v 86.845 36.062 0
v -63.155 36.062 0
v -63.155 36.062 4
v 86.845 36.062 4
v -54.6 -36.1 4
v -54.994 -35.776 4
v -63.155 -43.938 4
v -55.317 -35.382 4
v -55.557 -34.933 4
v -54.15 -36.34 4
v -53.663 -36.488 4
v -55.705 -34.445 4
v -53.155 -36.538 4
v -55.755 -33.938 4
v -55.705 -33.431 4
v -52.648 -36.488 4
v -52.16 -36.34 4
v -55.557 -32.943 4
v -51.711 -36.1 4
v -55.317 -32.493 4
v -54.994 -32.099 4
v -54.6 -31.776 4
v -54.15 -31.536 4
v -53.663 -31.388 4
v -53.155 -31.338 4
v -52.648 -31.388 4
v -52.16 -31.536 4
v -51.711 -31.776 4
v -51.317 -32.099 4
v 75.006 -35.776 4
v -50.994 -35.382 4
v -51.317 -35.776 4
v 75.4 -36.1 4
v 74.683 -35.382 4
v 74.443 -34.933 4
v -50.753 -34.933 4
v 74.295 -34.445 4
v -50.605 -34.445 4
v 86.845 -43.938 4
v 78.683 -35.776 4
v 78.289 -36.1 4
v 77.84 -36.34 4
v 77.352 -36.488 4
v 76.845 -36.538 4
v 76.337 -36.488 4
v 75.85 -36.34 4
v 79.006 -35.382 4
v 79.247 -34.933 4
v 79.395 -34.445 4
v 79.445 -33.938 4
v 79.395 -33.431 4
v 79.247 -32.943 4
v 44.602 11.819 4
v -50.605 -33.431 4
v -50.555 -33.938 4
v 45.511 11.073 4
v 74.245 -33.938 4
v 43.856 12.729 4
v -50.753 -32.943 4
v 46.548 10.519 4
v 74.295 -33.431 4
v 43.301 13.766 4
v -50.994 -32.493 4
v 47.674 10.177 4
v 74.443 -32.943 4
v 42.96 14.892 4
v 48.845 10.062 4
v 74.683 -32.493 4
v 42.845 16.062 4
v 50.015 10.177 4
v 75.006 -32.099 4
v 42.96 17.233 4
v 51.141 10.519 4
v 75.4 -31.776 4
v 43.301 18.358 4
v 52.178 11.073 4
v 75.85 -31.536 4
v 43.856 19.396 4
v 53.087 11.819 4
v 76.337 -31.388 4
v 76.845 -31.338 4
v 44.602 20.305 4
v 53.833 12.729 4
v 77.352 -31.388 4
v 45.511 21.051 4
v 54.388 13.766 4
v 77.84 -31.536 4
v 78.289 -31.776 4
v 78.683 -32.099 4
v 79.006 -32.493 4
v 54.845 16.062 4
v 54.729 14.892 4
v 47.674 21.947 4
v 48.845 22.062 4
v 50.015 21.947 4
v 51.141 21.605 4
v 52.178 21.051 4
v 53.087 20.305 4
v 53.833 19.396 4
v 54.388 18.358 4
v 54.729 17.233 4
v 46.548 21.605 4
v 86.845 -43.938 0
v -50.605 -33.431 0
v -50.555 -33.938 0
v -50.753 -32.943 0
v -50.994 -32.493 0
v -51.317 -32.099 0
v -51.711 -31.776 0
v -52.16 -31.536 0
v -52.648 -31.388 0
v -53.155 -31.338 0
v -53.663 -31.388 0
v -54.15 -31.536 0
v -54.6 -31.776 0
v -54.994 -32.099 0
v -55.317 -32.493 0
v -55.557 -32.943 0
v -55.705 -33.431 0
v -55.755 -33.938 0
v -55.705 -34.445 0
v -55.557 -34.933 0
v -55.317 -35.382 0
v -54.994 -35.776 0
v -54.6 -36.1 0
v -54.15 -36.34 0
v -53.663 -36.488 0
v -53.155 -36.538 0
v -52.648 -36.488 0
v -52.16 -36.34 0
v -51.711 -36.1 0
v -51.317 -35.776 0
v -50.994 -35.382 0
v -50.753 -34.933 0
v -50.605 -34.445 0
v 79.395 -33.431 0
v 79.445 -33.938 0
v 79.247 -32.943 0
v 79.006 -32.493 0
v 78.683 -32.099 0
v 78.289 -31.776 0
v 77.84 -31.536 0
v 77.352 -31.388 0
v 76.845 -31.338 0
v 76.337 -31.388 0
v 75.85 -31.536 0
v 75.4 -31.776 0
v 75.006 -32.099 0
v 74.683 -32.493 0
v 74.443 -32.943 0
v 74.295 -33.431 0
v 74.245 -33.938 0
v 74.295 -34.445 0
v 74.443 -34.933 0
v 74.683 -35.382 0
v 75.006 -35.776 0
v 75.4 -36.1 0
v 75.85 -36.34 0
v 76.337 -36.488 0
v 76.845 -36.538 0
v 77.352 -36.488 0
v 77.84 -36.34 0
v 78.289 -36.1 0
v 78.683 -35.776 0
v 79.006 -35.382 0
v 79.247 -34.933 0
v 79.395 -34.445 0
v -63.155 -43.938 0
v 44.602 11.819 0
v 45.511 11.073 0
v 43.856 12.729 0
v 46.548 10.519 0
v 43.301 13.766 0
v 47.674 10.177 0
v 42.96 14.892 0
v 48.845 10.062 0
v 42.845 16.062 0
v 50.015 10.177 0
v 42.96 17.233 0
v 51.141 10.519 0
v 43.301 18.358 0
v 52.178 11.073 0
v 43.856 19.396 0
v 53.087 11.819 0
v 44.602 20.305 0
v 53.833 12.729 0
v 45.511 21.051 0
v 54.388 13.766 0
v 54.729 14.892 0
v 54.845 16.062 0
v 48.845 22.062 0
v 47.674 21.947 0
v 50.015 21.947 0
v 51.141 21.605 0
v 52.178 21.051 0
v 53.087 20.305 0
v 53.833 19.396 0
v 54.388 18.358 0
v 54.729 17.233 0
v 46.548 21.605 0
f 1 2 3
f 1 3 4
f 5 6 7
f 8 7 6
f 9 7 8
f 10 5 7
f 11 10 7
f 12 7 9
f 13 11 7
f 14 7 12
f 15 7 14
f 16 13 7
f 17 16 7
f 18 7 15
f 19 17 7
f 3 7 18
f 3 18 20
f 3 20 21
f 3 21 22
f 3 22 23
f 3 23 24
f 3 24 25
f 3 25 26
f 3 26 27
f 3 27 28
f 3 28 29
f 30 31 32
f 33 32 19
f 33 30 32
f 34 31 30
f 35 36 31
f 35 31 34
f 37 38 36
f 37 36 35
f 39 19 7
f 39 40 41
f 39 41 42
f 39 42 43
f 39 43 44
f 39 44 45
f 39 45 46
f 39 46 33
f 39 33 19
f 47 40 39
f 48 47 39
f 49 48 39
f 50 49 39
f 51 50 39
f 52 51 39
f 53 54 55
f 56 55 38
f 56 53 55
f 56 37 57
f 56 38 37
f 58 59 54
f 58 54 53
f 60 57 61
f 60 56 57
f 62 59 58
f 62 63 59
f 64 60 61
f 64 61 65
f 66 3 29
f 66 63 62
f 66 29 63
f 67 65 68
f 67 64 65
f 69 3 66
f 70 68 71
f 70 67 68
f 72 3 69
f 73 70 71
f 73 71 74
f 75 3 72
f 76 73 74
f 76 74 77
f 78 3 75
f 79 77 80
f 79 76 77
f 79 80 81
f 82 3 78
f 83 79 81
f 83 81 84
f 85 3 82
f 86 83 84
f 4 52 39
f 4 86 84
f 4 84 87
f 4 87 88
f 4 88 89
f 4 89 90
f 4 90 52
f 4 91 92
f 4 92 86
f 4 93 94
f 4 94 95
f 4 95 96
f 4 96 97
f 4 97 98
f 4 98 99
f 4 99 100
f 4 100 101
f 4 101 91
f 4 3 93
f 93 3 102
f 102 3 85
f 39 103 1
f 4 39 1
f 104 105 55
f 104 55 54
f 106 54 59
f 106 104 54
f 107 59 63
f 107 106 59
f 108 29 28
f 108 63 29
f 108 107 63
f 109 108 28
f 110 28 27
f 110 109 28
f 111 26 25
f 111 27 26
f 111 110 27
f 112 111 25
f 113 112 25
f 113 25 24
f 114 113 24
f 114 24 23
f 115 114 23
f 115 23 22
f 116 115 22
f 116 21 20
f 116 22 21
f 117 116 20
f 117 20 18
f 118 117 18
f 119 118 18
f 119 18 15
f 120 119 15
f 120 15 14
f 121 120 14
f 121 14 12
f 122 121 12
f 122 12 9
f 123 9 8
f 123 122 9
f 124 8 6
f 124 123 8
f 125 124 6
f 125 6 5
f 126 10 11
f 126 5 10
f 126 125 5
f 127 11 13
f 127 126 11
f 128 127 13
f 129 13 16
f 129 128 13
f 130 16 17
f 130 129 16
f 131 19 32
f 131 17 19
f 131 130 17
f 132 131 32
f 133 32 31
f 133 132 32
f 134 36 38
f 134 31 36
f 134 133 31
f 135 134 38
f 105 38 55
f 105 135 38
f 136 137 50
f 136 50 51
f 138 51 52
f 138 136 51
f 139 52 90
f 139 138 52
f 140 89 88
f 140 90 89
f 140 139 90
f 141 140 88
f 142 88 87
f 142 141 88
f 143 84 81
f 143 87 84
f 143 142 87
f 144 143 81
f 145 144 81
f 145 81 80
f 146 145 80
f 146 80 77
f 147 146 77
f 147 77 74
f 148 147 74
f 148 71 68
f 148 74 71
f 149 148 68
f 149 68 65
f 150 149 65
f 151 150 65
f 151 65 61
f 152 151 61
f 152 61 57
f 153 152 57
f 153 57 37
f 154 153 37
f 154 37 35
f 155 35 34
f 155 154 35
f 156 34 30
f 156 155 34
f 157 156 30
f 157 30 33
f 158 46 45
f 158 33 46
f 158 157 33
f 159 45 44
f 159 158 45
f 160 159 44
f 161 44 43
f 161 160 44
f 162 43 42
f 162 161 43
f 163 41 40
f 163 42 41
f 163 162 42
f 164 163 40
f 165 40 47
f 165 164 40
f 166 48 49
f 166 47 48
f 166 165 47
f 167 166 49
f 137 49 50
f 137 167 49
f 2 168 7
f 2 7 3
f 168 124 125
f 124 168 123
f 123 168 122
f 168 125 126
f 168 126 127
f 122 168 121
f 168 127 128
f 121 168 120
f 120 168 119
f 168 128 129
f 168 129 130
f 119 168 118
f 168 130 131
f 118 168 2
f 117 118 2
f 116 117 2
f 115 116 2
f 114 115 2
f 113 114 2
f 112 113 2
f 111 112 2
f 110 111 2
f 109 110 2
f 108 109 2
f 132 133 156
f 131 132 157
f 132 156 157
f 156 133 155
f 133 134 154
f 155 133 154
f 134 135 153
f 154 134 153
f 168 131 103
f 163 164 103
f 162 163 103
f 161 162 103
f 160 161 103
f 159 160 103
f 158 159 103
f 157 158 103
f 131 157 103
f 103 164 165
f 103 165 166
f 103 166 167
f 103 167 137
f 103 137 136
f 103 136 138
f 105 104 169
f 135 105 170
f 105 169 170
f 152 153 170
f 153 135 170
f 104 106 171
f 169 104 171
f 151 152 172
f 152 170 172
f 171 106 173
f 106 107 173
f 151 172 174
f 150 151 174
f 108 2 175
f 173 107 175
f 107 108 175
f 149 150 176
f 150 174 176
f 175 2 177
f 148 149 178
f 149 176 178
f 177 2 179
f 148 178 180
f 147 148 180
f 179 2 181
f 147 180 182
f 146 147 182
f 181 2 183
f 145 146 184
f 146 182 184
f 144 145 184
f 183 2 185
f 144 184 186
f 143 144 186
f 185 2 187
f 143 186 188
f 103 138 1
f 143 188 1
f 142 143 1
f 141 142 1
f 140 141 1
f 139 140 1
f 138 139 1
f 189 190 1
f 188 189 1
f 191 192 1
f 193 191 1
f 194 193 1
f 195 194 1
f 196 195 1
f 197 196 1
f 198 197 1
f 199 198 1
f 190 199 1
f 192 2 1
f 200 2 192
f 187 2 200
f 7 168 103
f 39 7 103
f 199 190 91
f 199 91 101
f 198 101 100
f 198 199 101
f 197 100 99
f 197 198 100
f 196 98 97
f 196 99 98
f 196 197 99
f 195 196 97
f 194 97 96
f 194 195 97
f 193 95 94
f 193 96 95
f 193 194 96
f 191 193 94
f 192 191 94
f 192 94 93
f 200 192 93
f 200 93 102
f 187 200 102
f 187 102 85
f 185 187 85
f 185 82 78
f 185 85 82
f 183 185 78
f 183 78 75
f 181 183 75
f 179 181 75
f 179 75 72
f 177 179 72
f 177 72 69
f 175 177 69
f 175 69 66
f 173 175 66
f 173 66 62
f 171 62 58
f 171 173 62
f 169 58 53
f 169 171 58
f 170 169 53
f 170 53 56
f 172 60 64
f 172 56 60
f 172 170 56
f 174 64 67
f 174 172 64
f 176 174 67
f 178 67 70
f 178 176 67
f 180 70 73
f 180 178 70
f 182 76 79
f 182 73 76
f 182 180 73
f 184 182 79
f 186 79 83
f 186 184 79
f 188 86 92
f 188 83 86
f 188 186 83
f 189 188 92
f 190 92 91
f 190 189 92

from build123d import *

# Parameters (mm, degrees)
SKETCH_1_W               = 150
SKETCH_1_H               = 80
EXTRUDE_1_DEPTH          = 4
CUT_EXTRUDE_2_DEPTH      = 12
CUT_EXTRUDE_2_DEPTH_BACK = 27
SKETCH_2_R               = 6
SKETCH_2_R_2             = 2.6


with BuildPart() as part:
    # 草图1 → 凸台-拉伸1 (new body)
    with BuildSketch(Plane.XY):
        with Locations((11.84459115, -3.937887846)):
            Rectangle(SKETCH_1_W, SKETCH_1_H)
    extrude(amount=EXTRUDE_1_DEPTH)

    # 草图2 → 切除-拉伸2 (cut, two sides: drawn at the far end of the back side and taken through both)
    with BuildSketch(Plane.XY.offset(4).offset(-CUT_EXTRUDE_2_DEPTH_BACK)):
        with Locations((48.84459115, 16.062112154)):
            Circle(SKETCH_2_R)
        with Locations((-53.15540885, -33.937887846)):
            Circle(SKETCH_2_R_2)
        with Locations((76.84459115, -33.937887846)):
            Circle(SKETCH_2_R_2)
    extrude(amount=CUT_EXTRUDE_2_DEPTH + CUT_EXTRUDE_2_DEPTH_BACK, mode=Mode.SUBTRACT)


solid = part.part
